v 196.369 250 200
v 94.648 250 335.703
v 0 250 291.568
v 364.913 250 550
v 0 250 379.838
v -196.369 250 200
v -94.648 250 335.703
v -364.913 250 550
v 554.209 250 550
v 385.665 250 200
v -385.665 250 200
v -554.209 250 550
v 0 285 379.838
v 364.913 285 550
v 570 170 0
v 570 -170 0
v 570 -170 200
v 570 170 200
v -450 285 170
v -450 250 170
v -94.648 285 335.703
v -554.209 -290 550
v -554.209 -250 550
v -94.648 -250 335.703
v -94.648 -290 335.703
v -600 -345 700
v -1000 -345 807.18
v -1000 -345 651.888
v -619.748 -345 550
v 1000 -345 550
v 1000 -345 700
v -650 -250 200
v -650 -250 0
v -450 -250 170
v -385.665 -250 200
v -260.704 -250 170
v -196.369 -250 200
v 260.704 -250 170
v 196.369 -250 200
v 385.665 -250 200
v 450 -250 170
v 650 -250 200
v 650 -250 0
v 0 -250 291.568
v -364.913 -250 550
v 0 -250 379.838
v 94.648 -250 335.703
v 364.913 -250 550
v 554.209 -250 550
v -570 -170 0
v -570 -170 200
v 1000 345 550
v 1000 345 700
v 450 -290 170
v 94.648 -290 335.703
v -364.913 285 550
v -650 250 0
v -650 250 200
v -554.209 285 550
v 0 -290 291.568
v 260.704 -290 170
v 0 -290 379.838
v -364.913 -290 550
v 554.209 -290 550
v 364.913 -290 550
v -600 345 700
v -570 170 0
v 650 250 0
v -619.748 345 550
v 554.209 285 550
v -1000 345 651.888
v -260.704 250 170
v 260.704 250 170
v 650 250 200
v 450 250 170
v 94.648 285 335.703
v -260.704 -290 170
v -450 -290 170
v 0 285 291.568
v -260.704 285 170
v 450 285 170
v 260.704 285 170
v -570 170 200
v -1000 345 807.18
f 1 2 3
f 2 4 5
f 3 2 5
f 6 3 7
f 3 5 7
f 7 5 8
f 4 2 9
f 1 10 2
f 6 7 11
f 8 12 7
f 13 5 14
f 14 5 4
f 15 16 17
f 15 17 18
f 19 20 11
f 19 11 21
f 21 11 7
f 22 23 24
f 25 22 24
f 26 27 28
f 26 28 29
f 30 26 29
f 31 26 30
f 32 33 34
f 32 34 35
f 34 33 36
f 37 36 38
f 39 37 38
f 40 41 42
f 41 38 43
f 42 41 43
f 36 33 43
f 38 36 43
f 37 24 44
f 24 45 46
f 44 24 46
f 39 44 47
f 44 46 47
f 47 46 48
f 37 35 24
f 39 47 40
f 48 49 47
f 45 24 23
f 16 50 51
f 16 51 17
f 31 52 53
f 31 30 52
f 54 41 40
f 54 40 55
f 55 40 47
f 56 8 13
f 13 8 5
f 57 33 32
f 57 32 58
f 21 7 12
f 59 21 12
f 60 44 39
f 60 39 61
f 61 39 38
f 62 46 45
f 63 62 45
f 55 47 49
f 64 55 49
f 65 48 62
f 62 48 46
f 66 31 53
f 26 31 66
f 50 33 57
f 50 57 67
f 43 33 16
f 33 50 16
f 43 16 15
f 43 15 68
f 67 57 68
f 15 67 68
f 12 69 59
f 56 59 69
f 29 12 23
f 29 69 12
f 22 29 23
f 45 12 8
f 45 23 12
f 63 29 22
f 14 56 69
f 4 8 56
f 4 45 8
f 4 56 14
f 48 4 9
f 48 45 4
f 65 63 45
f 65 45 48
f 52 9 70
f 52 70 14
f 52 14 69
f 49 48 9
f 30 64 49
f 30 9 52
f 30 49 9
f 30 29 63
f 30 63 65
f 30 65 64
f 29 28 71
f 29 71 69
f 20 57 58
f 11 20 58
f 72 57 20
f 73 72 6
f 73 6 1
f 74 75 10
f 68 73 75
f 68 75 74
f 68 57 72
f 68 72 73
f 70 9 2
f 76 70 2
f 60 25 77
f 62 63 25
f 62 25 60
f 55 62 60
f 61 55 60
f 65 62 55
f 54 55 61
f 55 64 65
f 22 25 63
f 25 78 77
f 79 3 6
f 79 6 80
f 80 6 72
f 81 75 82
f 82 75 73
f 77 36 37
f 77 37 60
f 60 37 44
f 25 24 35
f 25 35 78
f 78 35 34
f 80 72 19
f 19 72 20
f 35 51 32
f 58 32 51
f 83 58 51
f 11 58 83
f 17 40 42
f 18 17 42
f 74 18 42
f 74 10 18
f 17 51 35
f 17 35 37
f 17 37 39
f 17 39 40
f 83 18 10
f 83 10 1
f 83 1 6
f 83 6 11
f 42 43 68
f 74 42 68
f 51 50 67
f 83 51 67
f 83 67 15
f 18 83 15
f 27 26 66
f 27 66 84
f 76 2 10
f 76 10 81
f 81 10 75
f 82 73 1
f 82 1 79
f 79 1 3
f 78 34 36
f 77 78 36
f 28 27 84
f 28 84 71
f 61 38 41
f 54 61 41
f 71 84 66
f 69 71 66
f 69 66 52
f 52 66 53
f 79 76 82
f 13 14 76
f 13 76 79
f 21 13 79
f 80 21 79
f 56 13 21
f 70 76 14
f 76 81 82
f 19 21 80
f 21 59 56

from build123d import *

# Parameters (mm, degrees)
F0_W     = 1300
F0_H     = 500
F0_W_2   = 1140
F0_H_2   = 340
F1_DEPTH = 200
F3_DEPTH = 345
F5_DEPTH = 40
F7_DEPTH = 35


# Not quite as in the source:
# - a feature names something its author has since deleted; it is built from what else it names


with BuildPart() as f1:
    # F0 (on Top) → F1 (new body)
    with BuildSketch(Plane.XY):
        Rectangle(F0_W, F0_H)
        Rectangle(F0_W_2, F0_H_2, mode=Mode.SUBTRACT)
    extrude(amount=F1_DEPTH)



with BuildPart() as f3:
    # F2 (on Front) → F3 (new body, symmetric)
    with BuildSketch(Plane.XZ):
        Polygon((1000, 700), (-600, 700), (-1000, 807.1796769724), (-1000, 651.8882499109), (-619.7478746381, 550), (1000, 550), align=None)
    extrude(amount=F3_DEPTH, both=True)


with BuildPart() as f1_1:
    add(f1.part)

    add(f3.part)  # F5 merges F3
    # F4 (on face) → F5 (join)
    with BuildSketch(Plane.XZ.offset(250)):
        Polygon((-385.6647923847, 200), (-450, 170), (-260.7038733478, 170), (-196.3686657325, 200), align=None)
        Polygon((-94.6480633261, 335.7033294112), (-385.6647923847, 200), (-196.3686657325, 200), (0, 291.5682126528), align=None)
        Polygon((-554.2087564458, 550), (-94.6480633261, 335.7033294112), (0, 379.8384461697), (-364.9126297936, 550), align=None)
        Polygon((0, 379.8384461697), (-94.6480633261, 335.7033294112), (0, 291.5682126528), (94.6480633261, 335.7033294112), align=None)
        Polygon((364.9126297936, 550), (0, 379.8384461697), (94.6480633261, 335.7033294112), (554.2087564458, 550), align=None)
        Polygon((94.6480633261, 335.7033294112), (0, 291.5682126528), (196.3686657325, 200), (385.6647923847, 200), align=None)
        Polygon((385.6647923847, 200), (196.3686657325, 200), (260.7038733478, 170), (450, 170), align=None)
    extrude(amount=F5_DEPTH)

    # F6 (on face) → F7 (join)
    with BuildSketch(Plane(origin=(0, 250, 0), x_dir=(-1, 0, 0), z_dir=(0, 1, 0))):
        Polygon((-554.2087564458, 550), (-94.6480633261, 335.7033294113), (0, 379.8384461697), (-364.9126297936, 550), align=None)
        Polygon((364.9126297936, 550), (0, 379.8384461697), (94.6480633261, 335.7033294113), (554.2087564458, 550), align=None)
        Polygon((0, 379.8384461697), (-94.6480633261, 335.7033294113), (0, 291.5682126528), (94.6480633261, 335.7033294113), align=None)
        Polygon((-94.6480633261, 335.7033294113), (-385.6647923847, 200), (-196.3686657325, 200), (0, 291.5682126528), align=None)
        Polygon((94.6480633261, 335.7033294113), (0, 291.5682126528), (196.3686657325, 200), (385.6647923847, 200), align=None)
        Polygon((385.6647923847, 200), (196.3686657325, 200), (260.7038733478, 170), (450, 170), align=None)
        Polygon((-385.6647923847, 200), (-450, 170), (-260.7038733478, 170), (-196.3686657325, 200), align=None)
    extrude(amount=F7_DEPTH)


solid = f1_1.part
